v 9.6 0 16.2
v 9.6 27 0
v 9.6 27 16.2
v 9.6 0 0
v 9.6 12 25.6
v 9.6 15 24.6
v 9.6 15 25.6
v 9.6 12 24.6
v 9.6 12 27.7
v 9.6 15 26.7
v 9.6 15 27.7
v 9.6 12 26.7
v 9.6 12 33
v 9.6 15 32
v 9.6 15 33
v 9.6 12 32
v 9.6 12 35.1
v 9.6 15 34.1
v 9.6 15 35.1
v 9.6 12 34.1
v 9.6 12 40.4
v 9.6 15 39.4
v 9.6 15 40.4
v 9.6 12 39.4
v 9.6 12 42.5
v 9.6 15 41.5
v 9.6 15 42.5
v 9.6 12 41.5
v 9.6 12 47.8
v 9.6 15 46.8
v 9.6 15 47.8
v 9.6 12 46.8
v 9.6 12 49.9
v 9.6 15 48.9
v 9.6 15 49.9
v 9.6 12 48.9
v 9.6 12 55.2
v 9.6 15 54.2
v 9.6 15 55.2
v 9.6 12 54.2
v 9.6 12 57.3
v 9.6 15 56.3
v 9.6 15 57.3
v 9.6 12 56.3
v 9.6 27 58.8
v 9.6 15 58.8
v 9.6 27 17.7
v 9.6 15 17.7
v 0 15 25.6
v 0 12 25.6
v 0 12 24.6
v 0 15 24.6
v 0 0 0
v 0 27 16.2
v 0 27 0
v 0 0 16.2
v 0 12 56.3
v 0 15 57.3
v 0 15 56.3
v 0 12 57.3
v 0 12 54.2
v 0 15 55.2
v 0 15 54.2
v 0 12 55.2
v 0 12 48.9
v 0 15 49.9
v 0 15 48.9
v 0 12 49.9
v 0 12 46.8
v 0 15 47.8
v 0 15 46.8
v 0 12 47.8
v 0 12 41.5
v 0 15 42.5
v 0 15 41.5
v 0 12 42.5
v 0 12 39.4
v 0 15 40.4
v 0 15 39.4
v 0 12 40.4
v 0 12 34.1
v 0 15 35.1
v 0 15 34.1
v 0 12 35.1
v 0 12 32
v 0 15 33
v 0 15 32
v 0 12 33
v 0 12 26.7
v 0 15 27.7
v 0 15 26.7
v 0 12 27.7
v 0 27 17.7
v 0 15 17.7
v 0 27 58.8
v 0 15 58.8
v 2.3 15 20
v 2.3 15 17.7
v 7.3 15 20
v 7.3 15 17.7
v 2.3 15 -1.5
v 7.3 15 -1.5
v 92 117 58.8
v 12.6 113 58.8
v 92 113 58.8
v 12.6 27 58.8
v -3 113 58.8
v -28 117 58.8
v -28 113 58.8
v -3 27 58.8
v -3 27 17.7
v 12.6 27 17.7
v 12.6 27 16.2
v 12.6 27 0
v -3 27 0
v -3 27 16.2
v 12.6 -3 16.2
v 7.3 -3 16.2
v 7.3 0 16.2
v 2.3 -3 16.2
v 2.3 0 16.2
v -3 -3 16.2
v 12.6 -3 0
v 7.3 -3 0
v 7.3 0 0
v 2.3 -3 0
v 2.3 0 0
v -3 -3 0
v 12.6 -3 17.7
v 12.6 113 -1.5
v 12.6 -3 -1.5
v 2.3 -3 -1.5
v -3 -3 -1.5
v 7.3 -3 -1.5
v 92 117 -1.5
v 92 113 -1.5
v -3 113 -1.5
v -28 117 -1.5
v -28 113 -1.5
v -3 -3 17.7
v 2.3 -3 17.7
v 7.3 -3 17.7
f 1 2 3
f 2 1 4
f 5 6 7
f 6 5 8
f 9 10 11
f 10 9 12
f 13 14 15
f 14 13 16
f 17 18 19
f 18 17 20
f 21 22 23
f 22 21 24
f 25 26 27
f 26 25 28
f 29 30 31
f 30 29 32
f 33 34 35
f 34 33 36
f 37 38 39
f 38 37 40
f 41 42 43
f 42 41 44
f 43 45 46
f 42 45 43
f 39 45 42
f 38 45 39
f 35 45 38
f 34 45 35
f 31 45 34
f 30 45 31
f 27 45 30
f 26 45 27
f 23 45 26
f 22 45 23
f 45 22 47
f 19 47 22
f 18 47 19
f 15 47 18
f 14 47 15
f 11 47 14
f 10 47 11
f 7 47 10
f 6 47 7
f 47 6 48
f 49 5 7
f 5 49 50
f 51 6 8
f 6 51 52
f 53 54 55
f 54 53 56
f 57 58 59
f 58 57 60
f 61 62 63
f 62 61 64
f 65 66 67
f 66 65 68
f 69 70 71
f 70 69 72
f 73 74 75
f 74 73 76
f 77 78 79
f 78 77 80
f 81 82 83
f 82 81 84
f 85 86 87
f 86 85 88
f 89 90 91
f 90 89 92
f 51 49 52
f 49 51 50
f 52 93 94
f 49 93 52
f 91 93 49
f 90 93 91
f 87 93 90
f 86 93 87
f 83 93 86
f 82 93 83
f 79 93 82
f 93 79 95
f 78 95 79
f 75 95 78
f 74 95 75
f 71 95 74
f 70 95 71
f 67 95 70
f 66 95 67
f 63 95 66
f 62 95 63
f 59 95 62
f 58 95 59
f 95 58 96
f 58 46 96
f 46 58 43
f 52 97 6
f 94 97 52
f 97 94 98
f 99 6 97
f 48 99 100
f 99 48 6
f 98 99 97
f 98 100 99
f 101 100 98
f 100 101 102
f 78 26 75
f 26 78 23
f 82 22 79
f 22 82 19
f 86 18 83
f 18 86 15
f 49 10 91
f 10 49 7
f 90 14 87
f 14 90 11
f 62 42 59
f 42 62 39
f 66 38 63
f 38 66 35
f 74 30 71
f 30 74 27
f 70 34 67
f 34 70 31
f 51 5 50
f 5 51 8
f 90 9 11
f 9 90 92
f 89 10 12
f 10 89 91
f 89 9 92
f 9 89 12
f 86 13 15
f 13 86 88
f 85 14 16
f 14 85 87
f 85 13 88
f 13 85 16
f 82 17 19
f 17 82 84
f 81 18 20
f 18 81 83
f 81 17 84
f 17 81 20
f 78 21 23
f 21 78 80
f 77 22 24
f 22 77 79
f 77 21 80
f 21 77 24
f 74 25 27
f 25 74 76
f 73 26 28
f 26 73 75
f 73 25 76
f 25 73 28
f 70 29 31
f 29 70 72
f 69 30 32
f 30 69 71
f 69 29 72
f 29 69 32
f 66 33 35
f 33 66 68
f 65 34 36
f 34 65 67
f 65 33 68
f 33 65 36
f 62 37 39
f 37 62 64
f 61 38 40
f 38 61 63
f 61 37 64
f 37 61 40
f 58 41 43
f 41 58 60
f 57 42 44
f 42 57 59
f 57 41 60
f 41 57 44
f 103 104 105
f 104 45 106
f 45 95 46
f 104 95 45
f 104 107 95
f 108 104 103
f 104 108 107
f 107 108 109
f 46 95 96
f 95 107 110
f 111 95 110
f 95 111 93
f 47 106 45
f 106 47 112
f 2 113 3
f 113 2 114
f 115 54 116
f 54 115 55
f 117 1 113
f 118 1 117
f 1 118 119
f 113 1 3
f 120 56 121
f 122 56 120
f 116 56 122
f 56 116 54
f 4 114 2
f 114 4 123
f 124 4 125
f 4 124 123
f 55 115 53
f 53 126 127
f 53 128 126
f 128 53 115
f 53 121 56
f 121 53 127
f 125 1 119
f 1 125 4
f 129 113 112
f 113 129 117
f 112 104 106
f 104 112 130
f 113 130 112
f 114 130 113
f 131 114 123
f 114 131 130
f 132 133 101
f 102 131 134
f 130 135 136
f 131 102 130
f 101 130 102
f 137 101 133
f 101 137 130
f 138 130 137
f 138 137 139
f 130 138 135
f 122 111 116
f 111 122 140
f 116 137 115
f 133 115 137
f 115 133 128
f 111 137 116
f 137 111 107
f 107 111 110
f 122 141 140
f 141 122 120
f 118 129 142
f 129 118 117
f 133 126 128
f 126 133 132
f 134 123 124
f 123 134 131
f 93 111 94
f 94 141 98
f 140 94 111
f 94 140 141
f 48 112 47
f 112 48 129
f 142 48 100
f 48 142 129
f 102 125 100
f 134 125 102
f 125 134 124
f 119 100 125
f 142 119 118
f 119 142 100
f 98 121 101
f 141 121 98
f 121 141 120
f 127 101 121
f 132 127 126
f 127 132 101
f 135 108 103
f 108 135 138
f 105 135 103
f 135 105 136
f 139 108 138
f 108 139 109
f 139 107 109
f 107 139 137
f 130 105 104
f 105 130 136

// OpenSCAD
// file: line.scad
//cube([100,100,15.8]);
servoW=12.6+0.4;
servoH=23.0+0.4;
    waku=4;

module servo(){
    cube([12.6+0.4,23.0+0.4,26.7]);
    translate([0,(23.0-32.4)/2,15.8])
    cube([12.6+0.4,32.4,2.4]);
    translate([(13-4.2)/2,23-8,-100])
    cube([4.2,13,18+100]);
}

module servos(num){
translate([servoW*4,0,0])
scale([-1,1,1])
    for(i = [0:num-1]){
        translate([i*13,0,(2.4+5)*i]){
            servo();
        }
    }
}

/**
* @deprecated
*/
module servo4_0(){
    servos(4);
}


module servoHolder(num){
translate([servoW*4,0,0])
scale([-1,1,1])
difference(){
union(){
    translate([-waku,-waku,0])
    cube([waku,waku*2+servoH,15.8]);
    translate([0,-waku,0]){
    for(i = [0:num-1]){
        translate([i*13,0,0]){
            cube([waku+servoW,waku*2+servoH,15.8+(2.4+5)*i]);
        }
    }
    }
}


union(){
    for(i = [0:num-1]){
        translate([i*13,0,(2.4+5)*i]){
            servo();
        }
    }
    
}
}
}

/**
*@deprecated
*/
module servo4(){
    servoHolder(4);
}

module servoRect(num, l=0){
    translate([-waku,-waku,0])
    cube([l==0?servoW*num+waku*2:l,servoH+waku+2,15.8]);
}

/**
* @deprecated
*/
module servo4_rect(l){
    servoRect(4, l);
}

module hikkake(l=servoW*4,d=10,fixPos=true,haba=1,thin=2,num=4){
    x=0;
    if(fixPos){
        x=-waku;
    }
    for(i=[1:1+num]){
        translate([0,-d,(2.4+5)*i+15.8+2.4-thin+1.5])
            cube([l,d,thin]);  
        translate([0,-d,(2.4+5)*i+15.8+2.4+haba+1.5])
            cube([l,d,thin]);  
    }

}

//servo4_0();
//servo();
//hikkake();
//

//for(i=[0:4]){
//translate([-waku,waku+servoH,(2.4+5)*i+15.8+2.4])
//cube([servoW*4,10,2]);
//}
//translate([-waku,waku+servoH,(2.4+5)+15.8+2.4])
//cube([servoW*2+waku,10,2]);
//translate([-waku,waku+servoH,(2.4+5)*2+15.8+2.4])
//cube([servoW+waku,10,2]);
//
//translate([100,0,0])
//servo4_rect();
//
//translate([0,50,0])
//servo4_rect();
// main file
include<line.scad>
//echo(servo*4+waku*2-0.4);
//translate([-10,0,0])
//cube([10-0.4,servoH+waku-0.4,(2.4+5)*4+15.8+2.4]);
//hikkake(l=10-0.4,d=2,thin=1,fixPos=false);
//servo();


    waku1=3;

module arm(){
    difference(){
        union(){
            cube([10-0.4,servoH+waku-0.4,15.8+0.4]);
            translate([0,15,0])
            {
                cube([10-0.4,servoH+waku-0.4-15,(2.4+5)*5+15.8+2.4+1+1.1+1.5]);
                hikkake(l=10-0.4,d=3,thin=1,fixPos=false, haba=1.1);
            }
            translate([-waku1,-waku1,-1.5])
                cube([10-0.4+waku1*2,servoH+waku-0.4+waku1,1.5]);
            translate([-waku1,-waku1,15.8+0.4])
                cube([10-0.4+waku1*2,servoH+waku-0.4+waku1,1.5]);
            //servo4_0();
        }
        translate([(10-0.4-5)/2,-waku1,-50])
        cube([5,15+waku1,70]);
    }
}


union(){

    arm();
    translate([-waku1,servoH+waku-0.4,-1.5])
    cube([10-0.4+waku1*2,90,(2.4+5)*5+15.8+2.4+1+1.1+1.5+1.5]);
    translate([-waku1-25,servoH+waku-0.4 + 90 - 4,-1.5])
    cube([120,4,(2.4+5)*5+15.8+2.4+1+1.1+1.5+1.5]);
    
}
